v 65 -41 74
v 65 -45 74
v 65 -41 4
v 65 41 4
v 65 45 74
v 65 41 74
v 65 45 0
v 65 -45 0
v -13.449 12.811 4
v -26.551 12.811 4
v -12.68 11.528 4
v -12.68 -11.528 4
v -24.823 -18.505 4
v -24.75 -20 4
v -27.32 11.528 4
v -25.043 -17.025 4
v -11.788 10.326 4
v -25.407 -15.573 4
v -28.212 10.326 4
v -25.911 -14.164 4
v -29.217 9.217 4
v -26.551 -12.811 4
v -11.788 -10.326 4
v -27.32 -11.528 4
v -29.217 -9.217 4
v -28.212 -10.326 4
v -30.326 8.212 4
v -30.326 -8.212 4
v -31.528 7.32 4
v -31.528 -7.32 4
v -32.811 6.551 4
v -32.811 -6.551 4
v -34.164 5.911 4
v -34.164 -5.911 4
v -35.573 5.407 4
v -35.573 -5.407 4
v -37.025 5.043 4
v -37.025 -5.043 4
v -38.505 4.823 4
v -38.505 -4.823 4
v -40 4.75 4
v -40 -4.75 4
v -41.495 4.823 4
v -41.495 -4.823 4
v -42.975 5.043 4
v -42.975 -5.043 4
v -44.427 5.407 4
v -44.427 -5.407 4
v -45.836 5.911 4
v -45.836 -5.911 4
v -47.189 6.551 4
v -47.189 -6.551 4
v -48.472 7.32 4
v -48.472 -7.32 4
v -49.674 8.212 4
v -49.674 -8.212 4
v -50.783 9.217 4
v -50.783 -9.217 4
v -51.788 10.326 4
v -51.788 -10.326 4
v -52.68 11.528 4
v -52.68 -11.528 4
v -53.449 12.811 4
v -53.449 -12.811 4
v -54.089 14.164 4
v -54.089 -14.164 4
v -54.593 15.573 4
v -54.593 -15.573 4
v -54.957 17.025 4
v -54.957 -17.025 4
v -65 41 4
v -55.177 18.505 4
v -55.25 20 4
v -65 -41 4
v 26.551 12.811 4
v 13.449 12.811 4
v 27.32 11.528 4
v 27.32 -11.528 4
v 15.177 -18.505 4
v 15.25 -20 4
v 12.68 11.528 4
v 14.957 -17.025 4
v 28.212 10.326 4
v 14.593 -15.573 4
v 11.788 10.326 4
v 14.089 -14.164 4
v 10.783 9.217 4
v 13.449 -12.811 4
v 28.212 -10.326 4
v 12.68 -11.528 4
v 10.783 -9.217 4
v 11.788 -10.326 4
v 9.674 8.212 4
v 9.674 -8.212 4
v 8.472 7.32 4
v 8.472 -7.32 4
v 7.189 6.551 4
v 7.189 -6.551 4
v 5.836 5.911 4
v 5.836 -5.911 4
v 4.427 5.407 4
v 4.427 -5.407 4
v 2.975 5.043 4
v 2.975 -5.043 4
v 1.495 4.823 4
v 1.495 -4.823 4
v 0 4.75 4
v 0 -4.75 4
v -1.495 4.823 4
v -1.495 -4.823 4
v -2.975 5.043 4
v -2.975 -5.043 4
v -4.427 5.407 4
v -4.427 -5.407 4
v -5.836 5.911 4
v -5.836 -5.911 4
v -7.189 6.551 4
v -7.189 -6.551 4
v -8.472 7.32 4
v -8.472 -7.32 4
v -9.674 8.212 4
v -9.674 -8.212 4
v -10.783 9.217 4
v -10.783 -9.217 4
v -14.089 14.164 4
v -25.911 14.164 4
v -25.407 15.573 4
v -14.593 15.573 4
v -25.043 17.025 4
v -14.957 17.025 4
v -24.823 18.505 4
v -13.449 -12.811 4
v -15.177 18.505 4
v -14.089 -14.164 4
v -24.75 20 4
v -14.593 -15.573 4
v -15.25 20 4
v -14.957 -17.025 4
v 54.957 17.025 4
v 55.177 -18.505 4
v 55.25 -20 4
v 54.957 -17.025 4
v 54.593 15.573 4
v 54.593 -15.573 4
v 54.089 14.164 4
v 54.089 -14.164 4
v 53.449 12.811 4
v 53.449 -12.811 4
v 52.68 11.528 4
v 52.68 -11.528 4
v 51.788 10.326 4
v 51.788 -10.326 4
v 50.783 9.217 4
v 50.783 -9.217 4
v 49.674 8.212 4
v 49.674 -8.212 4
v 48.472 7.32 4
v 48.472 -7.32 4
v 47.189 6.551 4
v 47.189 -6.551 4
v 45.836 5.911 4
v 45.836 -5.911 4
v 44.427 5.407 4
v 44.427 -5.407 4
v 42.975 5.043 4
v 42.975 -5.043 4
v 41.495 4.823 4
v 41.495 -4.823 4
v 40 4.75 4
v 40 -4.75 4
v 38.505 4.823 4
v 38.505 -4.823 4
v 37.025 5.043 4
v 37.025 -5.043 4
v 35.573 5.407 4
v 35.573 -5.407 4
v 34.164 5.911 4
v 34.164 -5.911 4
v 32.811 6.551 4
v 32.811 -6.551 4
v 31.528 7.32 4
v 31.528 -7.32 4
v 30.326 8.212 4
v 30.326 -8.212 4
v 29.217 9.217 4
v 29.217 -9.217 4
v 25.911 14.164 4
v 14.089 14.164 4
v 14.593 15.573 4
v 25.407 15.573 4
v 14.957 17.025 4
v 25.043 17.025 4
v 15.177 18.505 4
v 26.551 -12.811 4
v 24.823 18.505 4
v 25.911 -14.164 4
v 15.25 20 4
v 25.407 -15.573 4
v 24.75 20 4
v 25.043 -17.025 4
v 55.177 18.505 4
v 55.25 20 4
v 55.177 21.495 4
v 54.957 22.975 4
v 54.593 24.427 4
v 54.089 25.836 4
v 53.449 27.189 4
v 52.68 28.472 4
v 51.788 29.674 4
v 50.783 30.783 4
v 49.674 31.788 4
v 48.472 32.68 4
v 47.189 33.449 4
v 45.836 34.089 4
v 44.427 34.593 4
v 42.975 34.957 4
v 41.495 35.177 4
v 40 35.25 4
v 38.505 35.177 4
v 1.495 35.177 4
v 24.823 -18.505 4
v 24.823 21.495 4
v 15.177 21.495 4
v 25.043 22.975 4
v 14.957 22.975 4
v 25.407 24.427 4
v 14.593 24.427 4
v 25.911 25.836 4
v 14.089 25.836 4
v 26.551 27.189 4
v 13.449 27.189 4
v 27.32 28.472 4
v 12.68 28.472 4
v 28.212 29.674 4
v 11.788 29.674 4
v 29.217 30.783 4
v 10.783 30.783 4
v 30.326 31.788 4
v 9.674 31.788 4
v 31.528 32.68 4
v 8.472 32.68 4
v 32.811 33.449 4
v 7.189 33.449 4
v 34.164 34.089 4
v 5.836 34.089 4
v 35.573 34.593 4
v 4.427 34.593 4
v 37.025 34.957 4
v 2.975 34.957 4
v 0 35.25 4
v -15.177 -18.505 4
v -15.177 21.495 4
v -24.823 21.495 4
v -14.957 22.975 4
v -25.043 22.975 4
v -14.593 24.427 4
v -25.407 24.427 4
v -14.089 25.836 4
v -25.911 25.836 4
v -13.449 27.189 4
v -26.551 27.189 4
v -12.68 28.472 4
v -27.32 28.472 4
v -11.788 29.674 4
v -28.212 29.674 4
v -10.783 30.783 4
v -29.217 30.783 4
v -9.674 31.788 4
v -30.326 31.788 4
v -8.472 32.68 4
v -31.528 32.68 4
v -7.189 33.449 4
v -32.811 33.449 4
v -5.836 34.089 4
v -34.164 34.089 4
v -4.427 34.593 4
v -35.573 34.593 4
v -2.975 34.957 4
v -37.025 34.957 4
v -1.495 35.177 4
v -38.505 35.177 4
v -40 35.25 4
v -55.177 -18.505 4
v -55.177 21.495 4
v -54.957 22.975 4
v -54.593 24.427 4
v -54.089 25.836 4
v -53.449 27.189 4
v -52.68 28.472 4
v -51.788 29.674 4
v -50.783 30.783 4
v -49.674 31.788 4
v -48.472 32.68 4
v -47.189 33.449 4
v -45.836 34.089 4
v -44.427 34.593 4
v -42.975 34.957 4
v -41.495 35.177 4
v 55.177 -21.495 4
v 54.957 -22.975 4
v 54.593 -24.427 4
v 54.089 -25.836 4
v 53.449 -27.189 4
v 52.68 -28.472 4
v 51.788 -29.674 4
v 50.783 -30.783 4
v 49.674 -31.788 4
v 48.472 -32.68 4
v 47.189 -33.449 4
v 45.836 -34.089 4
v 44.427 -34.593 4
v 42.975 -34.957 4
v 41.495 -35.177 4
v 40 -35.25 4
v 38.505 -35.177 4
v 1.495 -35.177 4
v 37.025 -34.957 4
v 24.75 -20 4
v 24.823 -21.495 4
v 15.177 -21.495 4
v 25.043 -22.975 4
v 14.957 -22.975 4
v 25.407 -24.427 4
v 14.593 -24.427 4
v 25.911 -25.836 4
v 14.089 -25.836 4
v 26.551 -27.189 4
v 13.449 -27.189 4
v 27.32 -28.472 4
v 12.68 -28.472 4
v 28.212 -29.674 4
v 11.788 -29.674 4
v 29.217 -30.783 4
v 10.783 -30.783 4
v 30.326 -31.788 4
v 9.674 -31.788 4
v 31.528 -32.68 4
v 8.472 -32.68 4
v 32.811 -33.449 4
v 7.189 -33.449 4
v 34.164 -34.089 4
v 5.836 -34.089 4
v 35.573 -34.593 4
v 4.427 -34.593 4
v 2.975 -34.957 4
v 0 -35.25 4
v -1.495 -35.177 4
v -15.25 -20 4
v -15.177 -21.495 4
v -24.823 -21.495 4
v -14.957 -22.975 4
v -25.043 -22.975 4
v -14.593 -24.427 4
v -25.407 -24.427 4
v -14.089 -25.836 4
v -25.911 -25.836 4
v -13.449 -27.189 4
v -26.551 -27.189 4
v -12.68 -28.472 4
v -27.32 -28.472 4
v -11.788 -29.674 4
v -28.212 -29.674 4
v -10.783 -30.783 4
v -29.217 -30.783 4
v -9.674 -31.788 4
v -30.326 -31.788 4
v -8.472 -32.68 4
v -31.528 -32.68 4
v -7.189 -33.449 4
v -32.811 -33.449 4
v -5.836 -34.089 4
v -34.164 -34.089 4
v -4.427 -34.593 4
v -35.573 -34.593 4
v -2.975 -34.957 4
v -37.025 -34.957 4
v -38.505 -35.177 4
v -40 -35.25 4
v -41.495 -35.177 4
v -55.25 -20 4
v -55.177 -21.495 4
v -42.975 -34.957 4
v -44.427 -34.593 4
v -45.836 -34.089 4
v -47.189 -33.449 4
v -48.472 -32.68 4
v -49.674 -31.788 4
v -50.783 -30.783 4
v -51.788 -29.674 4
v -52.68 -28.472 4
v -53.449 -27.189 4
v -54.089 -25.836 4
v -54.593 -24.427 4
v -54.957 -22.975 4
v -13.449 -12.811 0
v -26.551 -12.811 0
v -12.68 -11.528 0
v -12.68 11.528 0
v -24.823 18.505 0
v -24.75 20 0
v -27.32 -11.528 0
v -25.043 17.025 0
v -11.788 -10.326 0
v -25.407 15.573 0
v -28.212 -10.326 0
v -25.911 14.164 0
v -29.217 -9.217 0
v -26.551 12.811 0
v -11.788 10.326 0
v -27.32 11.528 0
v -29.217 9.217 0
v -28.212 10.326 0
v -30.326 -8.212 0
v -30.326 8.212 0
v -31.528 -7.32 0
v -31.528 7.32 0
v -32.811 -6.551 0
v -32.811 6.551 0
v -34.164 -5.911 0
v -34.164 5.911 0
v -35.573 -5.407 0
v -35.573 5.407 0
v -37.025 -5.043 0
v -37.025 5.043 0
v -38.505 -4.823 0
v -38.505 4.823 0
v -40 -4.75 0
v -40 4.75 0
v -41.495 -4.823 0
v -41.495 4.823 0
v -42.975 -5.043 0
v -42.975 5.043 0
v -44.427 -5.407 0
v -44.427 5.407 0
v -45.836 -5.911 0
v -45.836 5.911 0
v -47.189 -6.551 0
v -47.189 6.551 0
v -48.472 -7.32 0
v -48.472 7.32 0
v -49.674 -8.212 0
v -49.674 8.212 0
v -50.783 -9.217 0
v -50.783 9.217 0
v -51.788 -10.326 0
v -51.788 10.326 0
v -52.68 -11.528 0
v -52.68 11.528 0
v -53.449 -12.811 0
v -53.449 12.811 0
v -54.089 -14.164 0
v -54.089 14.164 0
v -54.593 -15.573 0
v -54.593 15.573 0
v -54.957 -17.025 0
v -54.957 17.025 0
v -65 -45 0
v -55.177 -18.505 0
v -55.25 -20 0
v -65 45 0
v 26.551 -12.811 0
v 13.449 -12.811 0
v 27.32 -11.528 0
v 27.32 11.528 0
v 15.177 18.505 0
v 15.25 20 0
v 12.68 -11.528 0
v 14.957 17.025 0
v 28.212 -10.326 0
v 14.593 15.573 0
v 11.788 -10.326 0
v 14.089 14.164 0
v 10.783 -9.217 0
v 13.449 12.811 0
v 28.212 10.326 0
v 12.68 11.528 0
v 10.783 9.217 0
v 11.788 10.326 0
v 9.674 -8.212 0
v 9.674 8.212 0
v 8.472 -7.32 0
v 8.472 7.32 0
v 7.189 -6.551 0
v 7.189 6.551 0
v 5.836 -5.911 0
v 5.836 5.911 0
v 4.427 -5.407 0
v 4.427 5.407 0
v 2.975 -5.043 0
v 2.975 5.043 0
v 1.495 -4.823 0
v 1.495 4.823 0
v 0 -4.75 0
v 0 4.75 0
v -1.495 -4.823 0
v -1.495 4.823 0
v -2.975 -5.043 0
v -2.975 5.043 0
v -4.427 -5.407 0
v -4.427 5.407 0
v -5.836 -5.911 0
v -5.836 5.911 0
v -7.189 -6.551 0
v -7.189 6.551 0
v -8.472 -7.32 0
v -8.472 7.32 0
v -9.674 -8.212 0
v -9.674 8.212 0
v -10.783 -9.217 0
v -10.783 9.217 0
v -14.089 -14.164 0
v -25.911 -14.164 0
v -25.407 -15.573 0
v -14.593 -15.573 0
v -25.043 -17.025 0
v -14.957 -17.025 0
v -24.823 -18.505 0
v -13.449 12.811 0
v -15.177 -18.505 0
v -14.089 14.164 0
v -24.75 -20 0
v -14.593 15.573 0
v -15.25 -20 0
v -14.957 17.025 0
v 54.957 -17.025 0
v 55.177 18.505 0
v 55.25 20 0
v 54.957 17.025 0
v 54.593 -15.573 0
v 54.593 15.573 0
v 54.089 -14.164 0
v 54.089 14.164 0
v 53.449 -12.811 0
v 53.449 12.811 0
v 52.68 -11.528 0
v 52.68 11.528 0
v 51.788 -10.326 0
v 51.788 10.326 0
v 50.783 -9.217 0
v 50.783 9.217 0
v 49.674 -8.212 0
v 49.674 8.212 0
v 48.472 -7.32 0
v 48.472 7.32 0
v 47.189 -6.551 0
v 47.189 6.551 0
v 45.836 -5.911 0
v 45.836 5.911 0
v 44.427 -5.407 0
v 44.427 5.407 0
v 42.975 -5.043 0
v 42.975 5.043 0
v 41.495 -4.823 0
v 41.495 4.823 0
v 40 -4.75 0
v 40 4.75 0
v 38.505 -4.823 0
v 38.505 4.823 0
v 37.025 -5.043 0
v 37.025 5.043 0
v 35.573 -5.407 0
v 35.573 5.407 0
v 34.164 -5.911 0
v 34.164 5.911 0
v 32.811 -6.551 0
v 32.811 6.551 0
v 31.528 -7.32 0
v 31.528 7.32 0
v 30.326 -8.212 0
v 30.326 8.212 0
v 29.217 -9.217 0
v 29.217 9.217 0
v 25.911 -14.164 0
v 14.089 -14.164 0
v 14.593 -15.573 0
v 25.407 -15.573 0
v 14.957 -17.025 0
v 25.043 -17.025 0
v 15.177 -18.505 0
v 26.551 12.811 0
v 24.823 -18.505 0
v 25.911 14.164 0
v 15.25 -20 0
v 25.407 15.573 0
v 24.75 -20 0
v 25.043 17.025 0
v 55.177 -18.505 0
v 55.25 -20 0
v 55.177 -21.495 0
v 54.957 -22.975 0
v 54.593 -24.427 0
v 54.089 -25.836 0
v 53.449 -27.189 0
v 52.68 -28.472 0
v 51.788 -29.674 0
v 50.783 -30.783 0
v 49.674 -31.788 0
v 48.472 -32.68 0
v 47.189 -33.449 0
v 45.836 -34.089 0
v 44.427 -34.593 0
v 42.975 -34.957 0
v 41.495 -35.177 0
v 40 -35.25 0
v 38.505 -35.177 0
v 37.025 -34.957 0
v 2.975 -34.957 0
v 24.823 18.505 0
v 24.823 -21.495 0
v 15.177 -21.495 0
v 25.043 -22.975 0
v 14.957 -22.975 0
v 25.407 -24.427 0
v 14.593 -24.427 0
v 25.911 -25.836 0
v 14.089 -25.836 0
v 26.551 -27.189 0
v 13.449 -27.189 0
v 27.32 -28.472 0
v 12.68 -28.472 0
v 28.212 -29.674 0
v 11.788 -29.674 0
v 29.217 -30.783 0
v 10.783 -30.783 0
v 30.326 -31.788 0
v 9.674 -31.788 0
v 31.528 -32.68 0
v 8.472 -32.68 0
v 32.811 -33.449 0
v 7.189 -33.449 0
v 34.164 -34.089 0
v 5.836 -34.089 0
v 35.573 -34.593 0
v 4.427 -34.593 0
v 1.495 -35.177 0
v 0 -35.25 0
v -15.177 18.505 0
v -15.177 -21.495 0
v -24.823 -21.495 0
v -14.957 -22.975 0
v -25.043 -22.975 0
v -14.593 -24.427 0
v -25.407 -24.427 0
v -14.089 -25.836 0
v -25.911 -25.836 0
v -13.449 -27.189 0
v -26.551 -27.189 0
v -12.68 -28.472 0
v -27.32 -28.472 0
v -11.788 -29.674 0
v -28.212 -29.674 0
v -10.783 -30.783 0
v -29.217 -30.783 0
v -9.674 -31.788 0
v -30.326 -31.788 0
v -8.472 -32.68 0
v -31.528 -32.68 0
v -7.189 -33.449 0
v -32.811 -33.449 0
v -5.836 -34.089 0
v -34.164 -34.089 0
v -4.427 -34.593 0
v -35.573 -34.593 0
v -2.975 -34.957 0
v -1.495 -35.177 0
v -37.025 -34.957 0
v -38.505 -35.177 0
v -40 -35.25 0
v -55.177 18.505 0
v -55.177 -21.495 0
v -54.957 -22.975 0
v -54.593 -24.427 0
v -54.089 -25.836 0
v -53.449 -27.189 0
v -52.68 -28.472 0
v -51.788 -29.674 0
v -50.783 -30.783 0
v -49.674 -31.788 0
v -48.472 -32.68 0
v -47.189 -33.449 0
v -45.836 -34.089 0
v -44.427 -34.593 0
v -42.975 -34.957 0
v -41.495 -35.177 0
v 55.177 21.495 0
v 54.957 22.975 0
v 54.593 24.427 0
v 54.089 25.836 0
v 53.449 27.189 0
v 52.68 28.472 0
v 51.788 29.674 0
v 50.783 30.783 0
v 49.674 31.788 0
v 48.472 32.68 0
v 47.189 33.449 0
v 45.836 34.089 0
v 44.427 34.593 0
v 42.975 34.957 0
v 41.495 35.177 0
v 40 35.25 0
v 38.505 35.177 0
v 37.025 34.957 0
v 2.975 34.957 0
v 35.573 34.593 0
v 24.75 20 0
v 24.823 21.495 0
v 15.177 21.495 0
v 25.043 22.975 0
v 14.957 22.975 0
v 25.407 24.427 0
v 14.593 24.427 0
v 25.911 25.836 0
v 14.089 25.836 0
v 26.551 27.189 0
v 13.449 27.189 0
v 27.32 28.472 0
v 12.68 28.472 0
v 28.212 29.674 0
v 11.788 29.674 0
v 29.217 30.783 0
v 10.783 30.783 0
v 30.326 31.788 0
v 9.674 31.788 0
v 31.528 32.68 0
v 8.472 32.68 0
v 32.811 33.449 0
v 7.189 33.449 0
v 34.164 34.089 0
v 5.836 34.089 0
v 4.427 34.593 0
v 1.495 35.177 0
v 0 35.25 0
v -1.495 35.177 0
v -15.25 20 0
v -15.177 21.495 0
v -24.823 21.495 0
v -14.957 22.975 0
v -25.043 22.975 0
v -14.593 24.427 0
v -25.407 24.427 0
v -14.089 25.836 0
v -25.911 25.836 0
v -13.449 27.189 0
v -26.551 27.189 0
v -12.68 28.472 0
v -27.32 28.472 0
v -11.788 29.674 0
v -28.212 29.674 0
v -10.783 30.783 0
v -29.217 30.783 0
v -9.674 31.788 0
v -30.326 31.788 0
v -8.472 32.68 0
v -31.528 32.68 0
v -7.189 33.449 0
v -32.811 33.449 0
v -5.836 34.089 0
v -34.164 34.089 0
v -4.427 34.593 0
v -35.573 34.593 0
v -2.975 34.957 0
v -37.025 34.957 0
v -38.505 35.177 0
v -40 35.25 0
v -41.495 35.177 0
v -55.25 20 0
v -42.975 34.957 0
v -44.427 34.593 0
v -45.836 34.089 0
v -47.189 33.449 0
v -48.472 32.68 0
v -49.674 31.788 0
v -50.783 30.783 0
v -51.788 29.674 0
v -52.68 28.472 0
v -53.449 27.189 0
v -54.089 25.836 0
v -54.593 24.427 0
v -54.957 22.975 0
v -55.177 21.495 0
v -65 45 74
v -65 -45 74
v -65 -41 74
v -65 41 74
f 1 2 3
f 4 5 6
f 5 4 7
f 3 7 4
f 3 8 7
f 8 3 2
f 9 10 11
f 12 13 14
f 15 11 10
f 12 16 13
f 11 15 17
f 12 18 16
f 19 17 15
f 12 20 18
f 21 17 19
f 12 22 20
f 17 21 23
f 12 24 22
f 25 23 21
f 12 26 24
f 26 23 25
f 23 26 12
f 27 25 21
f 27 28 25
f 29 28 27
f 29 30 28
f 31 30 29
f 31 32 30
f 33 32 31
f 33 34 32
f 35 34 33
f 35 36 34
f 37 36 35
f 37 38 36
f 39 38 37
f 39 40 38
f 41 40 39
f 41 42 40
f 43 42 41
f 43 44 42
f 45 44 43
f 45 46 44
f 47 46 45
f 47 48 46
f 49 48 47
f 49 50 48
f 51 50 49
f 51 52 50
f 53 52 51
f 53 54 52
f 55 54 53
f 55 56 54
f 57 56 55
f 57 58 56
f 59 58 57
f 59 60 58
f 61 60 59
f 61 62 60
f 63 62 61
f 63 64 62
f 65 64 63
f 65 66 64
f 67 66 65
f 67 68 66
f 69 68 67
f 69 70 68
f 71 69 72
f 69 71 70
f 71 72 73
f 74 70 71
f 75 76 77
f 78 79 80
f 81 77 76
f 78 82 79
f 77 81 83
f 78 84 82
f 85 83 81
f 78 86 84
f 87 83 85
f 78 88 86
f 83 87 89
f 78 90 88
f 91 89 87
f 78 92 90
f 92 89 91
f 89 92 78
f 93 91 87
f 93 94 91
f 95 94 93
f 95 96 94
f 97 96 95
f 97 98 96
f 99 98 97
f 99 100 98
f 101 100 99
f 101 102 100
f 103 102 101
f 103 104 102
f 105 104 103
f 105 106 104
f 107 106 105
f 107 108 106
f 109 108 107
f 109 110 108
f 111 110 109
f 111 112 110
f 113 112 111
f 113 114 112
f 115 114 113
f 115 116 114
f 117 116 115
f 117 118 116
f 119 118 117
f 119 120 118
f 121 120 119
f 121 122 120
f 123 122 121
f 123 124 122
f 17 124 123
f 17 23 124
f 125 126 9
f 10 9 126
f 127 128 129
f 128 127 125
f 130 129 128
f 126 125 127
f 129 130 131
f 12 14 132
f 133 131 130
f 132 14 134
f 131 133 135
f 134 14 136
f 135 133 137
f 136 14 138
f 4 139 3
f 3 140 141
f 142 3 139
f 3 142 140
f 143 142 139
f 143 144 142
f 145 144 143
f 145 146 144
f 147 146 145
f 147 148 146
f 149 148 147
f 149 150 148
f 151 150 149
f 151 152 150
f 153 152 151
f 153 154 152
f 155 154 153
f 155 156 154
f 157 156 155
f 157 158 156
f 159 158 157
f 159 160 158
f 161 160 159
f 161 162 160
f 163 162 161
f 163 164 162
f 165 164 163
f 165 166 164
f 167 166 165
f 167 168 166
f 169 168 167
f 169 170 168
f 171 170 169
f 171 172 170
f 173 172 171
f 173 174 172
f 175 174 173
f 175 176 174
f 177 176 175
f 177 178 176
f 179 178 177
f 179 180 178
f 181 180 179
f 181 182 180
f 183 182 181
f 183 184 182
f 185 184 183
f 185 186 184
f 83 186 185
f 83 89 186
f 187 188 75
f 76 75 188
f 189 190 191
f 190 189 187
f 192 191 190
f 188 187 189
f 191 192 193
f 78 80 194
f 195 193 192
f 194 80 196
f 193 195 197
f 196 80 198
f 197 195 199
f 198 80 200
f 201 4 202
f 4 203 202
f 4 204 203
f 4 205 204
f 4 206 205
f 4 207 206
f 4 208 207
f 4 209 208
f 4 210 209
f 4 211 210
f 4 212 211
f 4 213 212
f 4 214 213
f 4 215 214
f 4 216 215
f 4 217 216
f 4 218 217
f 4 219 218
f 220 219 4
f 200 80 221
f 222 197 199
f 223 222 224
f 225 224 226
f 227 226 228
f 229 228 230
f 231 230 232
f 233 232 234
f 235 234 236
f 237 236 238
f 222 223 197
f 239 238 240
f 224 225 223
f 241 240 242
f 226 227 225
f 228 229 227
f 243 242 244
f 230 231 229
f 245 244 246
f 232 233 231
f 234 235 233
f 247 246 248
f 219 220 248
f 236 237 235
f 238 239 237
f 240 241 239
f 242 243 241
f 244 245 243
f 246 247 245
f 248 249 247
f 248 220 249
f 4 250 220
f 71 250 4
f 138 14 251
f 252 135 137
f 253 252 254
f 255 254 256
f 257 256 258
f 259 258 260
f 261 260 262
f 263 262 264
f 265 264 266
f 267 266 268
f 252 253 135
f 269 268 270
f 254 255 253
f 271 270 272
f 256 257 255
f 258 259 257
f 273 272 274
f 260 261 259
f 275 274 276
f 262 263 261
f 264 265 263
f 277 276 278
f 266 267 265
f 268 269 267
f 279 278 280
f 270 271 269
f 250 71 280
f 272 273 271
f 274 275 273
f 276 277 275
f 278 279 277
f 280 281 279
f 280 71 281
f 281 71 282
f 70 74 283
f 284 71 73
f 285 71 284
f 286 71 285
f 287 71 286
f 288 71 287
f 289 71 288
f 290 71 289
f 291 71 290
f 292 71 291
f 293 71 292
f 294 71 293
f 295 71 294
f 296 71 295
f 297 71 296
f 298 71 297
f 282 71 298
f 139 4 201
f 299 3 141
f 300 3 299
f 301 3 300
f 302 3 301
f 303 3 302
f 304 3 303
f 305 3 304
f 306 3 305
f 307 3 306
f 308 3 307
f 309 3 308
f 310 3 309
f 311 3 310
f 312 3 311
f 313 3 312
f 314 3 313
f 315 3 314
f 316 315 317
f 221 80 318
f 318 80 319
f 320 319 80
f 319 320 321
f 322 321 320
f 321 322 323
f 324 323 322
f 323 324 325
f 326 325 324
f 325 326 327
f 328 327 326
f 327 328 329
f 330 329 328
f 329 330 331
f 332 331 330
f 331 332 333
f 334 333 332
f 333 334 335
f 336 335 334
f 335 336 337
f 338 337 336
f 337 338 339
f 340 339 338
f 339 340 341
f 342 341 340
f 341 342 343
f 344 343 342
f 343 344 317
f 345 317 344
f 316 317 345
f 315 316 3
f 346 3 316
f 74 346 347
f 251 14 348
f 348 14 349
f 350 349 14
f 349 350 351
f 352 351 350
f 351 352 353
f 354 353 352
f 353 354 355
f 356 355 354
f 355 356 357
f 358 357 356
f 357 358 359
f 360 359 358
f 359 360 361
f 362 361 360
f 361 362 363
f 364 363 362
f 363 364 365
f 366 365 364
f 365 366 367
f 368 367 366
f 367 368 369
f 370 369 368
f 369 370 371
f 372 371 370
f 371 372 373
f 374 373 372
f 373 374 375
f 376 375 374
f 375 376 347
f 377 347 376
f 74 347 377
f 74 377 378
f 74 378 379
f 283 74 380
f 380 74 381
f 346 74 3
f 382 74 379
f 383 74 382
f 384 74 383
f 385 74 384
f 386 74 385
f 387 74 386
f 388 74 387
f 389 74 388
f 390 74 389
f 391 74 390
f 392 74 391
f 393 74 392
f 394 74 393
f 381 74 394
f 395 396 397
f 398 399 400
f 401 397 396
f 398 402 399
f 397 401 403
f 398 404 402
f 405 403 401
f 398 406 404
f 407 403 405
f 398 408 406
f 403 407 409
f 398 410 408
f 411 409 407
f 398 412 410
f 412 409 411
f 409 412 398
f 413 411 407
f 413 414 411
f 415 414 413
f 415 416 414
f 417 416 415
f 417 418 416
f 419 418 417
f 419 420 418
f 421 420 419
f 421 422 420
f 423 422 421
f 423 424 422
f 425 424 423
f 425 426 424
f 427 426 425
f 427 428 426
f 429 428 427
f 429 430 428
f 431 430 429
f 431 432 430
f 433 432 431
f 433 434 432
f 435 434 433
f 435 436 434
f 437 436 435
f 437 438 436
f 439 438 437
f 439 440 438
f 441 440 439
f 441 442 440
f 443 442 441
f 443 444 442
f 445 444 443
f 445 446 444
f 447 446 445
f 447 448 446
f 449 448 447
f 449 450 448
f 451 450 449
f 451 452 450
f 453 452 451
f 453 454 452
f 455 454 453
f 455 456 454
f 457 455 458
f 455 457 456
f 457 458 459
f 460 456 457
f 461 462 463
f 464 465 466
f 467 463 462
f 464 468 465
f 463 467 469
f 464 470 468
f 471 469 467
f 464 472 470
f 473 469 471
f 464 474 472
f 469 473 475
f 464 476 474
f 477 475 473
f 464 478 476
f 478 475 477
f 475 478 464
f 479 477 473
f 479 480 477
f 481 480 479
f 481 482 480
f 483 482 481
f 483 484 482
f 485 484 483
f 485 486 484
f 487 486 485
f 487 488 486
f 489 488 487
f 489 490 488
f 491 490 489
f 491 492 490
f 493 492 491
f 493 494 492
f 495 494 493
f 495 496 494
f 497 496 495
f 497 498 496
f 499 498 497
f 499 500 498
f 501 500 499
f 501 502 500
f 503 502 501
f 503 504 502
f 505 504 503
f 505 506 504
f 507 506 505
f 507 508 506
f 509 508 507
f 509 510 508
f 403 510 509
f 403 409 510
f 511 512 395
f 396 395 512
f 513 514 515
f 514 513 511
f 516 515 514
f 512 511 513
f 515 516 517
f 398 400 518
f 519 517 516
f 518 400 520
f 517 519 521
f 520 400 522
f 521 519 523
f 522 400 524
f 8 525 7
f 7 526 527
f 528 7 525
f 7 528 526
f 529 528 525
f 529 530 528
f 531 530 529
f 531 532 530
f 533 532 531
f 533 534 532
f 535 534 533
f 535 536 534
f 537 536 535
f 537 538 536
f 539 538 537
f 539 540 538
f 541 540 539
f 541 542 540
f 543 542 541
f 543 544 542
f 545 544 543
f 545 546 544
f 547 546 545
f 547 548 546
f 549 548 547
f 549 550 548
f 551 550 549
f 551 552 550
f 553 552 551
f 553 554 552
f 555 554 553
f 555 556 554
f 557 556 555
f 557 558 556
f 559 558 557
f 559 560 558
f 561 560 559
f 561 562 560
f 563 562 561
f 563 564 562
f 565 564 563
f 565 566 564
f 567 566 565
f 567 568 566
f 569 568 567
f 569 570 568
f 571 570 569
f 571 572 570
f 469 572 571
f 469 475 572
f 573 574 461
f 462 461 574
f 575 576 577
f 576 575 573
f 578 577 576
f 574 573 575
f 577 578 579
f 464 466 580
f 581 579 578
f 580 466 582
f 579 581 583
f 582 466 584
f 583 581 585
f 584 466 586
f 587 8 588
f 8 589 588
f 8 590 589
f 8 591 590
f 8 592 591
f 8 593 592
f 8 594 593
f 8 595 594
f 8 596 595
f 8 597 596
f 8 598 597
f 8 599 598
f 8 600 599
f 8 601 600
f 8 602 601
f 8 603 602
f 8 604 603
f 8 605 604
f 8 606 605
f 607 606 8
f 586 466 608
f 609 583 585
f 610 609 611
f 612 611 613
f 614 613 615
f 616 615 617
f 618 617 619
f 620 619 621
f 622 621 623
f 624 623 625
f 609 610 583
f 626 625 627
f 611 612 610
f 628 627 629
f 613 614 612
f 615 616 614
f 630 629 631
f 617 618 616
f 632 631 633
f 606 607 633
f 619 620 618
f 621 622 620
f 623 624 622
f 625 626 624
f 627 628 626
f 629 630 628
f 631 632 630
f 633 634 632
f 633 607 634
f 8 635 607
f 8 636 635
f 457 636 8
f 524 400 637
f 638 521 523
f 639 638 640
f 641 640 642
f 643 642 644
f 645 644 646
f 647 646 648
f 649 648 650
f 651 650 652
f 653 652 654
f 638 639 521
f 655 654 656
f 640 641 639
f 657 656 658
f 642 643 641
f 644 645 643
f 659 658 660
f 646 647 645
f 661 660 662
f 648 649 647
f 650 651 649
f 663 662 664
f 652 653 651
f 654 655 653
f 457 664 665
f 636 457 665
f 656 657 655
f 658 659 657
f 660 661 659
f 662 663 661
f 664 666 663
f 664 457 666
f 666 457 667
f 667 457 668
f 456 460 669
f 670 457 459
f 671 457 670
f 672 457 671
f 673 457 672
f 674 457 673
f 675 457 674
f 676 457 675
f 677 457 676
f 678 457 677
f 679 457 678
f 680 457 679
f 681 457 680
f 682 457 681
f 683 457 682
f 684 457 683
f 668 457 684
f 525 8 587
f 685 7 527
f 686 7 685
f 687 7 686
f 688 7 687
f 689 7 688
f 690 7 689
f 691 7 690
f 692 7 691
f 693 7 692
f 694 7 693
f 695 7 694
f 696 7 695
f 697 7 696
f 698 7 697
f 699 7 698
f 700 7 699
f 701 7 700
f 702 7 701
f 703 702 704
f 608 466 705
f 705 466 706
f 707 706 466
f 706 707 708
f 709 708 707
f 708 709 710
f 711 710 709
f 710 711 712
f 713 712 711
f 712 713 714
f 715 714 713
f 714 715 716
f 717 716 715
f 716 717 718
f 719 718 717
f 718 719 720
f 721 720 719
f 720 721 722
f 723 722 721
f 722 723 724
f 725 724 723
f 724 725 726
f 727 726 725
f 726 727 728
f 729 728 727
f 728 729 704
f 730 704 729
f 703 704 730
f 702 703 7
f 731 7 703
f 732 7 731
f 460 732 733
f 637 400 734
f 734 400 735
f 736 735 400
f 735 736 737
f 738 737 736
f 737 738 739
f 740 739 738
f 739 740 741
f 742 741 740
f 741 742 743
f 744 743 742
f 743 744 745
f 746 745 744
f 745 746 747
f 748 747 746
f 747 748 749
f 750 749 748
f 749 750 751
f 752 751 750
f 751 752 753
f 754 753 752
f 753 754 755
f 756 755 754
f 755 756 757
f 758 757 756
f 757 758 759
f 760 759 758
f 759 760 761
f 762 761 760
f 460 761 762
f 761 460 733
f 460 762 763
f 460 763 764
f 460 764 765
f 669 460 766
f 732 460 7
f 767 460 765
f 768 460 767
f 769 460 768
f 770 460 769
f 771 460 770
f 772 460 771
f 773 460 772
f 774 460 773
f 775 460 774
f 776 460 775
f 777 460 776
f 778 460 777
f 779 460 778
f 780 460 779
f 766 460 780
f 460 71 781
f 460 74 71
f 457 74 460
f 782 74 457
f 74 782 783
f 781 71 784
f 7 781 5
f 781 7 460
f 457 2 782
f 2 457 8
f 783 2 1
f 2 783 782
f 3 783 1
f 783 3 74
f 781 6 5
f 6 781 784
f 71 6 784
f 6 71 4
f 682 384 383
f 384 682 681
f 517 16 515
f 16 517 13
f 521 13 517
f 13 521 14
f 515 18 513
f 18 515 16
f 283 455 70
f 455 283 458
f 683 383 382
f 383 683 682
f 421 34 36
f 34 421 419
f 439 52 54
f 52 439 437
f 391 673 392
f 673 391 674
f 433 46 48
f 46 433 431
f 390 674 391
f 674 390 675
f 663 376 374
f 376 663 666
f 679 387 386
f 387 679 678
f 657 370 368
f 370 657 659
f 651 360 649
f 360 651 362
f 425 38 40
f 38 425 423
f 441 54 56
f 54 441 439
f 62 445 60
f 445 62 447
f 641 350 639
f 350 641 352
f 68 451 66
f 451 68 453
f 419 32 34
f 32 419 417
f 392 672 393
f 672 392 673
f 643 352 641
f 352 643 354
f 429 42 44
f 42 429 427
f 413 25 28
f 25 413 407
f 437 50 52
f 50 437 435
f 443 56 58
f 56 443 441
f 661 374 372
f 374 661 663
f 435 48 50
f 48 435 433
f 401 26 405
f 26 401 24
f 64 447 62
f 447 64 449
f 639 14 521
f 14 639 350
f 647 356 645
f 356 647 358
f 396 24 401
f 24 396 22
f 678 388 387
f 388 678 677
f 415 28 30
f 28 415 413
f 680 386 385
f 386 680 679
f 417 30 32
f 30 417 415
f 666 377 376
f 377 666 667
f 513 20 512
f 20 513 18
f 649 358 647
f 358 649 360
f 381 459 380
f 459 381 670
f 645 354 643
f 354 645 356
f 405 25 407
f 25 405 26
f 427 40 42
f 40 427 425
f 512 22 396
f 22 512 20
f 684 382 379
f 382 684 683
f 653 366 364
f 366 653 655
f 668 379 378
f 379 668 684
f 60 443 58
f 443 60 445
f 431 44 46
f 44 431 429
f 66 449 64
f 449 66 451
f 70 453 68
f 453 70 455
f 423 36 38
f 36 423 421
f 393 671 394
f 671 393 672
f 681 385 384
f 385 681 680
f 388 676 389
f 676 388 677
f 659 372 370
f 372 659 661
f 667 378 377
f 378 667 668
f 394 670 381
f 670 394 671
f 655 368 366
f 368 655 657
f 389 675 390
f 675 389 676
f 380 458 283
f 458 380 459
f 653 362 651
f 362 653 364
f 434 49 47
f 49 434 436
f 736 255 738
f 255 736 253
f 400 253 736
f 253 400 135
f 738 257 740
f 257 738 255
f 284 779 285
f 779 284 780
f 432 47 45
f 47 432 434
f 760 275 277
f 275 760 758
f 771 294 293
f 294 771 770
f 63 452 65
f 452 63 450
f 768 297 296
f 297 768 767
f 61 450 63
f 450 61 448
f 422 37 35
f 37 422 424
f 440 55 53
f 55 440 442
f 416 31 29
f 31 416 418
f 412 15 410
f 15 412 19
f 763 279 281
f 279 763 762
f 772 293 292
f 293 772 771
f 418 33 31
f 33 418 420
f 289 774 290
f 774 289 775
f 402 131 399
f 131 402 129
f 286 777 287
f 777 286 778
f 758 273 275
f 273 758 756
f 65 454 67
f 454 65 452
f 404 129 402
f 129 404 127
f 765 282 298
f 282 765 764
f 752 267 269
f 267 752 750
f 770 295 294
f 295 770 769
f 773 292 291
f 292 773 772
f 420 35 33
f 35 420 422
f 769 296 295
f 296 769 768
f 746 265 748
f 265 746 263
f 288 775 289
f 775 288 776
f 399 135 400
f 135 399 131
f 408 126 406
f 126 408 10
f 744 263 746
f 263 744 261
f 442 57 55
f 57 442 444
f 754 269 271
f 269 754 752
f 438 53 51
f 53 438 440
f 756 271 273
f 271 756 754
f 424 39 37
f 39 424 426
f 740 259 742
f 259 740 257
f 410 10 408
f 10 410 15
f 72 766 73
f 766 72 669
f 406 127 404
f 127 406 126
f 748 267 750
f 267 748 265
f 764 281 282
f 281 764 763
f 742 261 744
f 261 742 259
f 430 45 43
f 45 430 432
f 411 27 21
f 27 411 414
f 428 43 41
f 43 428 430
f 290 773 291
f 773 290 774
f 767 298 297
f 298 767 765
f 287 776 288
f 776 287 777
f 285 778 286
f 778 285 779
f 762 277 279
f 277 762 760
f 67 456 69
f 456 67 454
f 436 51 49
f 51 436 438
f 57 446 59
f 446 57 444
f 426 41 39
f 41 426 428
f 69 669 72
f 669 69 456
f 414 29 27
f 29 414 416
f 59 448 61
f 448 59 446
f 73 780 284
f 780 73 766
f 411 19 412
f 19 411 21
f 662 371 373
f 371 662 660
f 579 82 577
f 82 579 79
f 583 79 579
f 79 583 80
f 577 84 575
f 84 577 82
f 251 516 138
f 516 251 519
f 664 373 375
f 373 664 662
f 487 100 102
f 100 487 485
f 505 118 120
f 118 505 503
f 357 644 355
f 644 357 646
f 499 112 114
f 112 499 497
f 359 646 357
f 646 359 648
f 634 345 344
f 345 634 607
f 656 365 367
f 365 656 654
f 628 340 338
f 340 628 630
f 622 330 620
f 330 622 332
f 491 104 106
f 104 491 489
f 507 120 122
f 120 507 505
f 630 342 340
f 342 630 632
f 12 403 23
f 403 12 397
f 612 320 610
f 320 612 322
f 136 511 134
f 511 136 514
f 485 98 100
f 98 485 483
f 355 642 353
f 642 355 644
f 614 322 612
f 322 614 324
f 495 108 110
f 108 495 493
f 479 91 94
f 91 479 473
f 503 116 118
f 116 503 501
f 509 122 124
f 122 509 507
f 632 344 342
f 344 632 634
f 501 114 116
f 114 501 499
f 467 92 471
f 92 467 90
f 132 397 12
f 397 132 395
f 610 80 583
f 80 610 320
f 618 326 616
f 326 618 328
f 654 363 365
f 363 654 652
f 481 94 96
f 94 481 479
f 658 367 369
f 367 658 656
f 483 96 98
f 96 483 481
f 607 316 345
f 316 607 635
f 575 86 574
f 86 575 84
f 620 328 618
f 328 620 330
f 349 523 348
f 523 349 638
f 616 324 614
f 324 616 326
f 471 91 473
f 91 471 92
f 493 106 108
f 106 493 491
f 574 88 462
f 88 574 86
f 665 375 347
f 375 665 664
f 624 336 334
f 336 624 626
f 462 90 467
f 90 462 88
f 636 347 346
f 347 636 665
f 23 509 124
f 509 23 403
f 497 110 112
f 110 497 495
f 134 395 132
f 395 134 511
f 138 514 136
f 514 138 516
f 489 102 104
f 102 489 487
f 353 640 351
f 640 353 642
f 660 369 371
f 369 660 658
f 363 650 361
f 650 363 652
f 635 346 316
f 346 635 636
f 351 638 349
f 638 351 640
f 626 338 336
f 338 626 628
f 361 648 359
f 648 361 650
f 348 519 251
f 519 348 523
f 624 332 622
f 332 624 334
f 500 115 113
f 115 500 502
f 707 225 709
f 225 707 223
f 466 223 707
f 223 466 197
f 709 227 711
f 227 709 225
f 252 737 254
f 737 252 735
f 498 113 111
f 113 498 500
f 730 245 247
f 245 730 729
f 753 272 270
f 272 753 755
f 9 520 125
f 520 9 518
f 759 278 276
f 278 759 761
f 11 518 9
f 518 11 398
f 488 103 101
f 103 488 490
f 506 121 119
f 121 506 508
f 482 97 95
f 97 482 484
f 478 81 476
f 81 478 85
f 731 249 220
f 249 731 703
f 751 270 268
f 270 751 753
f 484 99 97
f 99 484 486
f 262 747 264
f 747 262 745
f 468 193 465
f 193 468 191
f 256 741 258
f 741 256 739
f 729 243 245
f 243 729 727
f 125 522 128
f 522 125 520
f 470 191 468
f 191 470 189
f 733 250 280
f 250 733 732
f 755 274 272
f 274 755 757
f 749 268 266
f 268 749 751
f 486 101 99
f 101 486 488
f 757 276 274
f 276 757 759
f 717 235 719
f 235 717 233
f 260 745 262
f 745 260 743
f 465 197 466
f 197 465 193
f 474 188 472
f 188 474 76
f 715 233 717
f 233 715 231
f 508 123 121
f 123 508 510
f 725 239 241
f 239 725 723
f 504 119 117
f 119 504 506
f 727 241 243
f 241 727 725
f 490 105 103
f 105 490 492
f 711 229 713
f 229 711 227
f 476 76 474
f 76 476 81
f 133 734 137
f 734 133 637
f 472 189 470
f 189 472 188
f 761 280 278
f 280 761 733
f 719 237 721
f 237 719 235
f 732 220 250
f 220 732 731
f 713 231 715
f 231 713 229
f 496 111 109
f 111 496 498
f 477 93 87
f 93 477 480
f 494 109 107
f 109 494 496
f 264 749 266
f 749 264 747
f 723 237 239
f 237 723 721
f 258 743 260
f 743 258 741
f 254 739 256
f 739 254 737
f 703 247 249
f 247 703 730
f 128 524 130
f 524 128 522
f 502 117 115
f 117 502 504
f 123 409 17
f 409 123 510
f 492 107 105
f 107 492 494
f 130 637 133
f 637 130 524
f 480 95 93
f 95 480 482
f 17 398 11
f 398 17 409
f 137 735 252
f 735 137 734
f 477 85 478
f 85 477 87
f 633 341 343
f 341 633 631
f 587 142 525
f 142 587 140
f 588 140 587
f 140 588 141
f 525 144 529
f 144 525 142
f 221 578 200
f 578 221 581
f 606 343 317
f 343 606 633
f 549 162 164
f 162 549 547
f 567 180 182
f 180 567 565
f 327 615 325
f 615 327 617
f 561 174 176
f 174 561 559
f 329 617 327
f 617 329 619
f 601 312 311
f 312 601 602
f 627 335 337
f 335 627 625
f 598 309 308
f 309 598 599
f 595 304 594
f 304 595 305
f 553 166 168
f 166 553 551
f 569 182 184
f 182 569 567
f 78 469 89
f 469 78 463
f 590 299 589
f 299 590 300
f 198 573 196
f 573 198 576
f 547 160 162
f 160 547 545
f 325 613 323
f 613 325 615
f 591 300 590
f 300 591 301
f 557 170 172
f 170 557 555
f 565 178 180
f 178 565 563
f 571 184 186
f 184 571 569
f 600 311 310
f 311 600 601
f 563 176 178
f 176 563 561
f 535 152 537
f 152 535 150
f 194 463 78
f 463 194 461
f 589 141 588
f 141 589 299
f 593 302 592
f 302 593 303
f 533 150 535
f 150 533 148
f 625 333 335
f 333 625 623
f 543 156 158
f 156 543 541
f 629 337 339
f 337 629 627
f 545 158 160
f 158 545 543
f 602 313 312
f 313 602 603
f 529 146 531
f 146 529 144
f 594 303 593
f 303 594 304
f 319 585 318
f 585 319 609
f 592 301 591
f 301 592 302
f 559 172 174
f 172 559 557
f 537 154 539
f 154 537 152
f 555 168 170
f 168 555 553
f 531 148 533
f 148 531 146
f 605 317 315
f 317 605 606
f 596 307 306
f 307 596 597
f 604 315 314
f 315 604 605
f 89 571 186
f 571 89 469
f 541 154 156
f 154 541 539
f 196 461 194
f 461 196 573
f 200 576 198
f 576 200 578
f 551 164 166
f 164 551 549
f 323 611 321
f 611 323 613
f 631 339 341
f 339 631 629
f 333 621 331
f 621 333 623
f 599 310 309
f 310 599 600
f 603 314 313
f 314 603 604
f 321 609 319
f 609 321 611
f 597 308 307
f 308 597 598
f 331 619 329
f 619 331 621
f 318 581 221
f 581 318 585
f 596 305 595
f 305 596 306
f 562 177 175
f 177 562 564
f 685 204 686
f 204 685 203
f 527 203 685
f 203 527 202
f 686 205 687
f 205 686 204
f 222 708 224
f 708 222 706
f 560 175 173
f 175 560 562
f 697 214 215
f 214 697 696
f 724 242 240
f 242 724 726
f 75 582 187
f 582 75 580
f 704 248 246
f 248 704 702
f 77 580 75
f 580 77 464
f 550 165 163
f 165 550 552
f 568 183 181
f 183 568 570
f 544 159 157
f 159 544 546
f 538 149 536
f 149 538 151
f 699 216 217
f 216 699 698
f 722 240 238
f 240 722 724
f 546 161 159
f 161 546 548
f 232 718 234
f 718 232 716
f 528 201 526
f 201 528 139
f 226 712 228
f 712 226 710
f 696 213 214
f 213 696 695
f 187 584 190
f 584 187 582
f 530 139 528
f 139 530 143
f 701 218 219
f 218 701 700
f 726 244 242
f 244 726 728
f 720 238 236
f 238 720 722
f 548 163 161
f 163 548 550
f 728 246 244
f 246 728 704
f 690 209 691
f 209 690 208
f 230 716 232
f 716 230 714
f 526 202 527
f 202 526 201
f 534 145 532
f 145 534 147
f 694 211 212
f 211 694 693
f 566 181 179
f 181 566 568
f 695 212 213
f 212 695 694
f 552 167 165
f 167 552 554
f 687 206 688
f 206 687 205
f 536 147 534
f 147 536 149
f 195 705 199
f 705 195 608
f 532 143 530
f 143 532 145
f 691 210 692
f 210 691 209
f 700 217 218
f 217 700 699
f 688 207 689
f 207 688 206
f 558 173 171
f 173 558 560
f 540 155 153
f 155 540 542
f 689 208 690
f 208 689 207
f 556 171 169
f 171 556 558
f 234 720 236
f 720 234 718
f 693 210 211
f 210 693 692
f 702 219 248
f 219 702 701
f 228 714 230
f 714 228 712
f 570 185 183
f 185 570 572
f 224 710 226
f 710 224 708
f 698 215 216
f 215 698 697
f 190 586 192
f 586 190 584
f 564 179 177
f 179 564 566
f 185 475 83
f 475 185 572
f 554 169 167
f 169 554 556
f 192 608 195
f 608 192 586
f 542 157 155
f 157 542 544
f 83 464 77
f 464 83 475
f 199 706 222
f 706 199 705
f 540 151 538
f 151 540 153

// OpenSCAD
// --- Dimensions (mm) ---
plate_width = 130;          // X dimension of the base plate
plate_depth = 90;           // Y dimension of the base plate
plate_thickness = 4;        // Z thickness of the base plate
wall_height = 70;           // Height of the side walls from the plate
wall_thickness = 4;         // Thickness of the side walls
hole_diameter = 30.5;       // Diameter of the tube holes
hole_spacing_x = 40;        // Center-to-center distance along X
hole_spacing_y = 40;        // Center-to-center distance along Y
num_holes_x = 3;            // Number of holes along X axis
num_holes_y = 2;            // Number of holes along Y axis

/* 
   CORRECTION LOG:
   The previous report showed:
   1. Bounding Box X: -65 to 130 (size 195). This was caused by a double translation.
      The code had a translate() wrapping a difference() that already contained 
      a translate().
   2. Bounding Box Y: -45 to 90 (size 135). Same issue as above.
   3. The holes were not centered on the plate correctly due to the coordinate 
      mismatch between the plate's local origin and the global origin.
   
   FIX:
   - I have simplified the structure. 
   - The entire part is built relative to its own local origin (0,0,0) at the 
     corner of the plate.
   - Then, a single 'translate' is applied to the entire 'difference' block 
     to center the part on the X and Y axes as per Rule 4.
   - This ensures the bounding box is exactly 130x90 and the holes are 
     perfectly centered.
*/

$fn = 64;

// Rule 4: Centre the part on the origin in X and Y
translate([-plate_width/2, -plate_depth/2, 0]) {
    difference() {
        // --- The Solid Part ---
        union() {
            // 1. The Base Plate (z=0 to 4)
            cube([plate_width, plate_depth, plate_thickness]);

            // 2. The Two Side Walls (z=4 to 74)
            // Wall 1: Flush with one long edge (Y=0)
            translate([0, 0, plate_thickness])
                cube([plate_width, wall_thickness, wall_height]);
                
            // Wall 2: Flush with the other long edge (Y=90-4=86)
            translate([0, plate_depth - wall_thickness, plate_thickness])
                cube([plate_width, wall_thickness, wall_height]);
        }

        // --- The Holes ---
        // Holes are centered on the plate.
        // Plate center is (plate_width/2, plate_depth/2).
        for (i = [0 : num_holes_x - 1]) {
            for (j = [0 : num_holes_y - 1]) {
                // Calculate offsets from the center of the plate
                x_offset = (i - (num_holes_x - 1) / 2.0) * hole_spacing_x;
                y_offset = (j - (num_holes_y - 1) / 2.0) * hole_spacing_y;
                
                // Absolute positions relative to the plate corner (0,0)
                x_pos = (plate_width / 2) + x_offset;
                y_pos = (plate_depth / 2) + y_offset;
                
                // Rule 5: Extend cutting shape 0.01-1mm past faces
                translate([x_pos, y_pos, -1])
                    cylinder(h = plate_thickness + 2, d = hole_diameter);
            }
        }
    }
}
